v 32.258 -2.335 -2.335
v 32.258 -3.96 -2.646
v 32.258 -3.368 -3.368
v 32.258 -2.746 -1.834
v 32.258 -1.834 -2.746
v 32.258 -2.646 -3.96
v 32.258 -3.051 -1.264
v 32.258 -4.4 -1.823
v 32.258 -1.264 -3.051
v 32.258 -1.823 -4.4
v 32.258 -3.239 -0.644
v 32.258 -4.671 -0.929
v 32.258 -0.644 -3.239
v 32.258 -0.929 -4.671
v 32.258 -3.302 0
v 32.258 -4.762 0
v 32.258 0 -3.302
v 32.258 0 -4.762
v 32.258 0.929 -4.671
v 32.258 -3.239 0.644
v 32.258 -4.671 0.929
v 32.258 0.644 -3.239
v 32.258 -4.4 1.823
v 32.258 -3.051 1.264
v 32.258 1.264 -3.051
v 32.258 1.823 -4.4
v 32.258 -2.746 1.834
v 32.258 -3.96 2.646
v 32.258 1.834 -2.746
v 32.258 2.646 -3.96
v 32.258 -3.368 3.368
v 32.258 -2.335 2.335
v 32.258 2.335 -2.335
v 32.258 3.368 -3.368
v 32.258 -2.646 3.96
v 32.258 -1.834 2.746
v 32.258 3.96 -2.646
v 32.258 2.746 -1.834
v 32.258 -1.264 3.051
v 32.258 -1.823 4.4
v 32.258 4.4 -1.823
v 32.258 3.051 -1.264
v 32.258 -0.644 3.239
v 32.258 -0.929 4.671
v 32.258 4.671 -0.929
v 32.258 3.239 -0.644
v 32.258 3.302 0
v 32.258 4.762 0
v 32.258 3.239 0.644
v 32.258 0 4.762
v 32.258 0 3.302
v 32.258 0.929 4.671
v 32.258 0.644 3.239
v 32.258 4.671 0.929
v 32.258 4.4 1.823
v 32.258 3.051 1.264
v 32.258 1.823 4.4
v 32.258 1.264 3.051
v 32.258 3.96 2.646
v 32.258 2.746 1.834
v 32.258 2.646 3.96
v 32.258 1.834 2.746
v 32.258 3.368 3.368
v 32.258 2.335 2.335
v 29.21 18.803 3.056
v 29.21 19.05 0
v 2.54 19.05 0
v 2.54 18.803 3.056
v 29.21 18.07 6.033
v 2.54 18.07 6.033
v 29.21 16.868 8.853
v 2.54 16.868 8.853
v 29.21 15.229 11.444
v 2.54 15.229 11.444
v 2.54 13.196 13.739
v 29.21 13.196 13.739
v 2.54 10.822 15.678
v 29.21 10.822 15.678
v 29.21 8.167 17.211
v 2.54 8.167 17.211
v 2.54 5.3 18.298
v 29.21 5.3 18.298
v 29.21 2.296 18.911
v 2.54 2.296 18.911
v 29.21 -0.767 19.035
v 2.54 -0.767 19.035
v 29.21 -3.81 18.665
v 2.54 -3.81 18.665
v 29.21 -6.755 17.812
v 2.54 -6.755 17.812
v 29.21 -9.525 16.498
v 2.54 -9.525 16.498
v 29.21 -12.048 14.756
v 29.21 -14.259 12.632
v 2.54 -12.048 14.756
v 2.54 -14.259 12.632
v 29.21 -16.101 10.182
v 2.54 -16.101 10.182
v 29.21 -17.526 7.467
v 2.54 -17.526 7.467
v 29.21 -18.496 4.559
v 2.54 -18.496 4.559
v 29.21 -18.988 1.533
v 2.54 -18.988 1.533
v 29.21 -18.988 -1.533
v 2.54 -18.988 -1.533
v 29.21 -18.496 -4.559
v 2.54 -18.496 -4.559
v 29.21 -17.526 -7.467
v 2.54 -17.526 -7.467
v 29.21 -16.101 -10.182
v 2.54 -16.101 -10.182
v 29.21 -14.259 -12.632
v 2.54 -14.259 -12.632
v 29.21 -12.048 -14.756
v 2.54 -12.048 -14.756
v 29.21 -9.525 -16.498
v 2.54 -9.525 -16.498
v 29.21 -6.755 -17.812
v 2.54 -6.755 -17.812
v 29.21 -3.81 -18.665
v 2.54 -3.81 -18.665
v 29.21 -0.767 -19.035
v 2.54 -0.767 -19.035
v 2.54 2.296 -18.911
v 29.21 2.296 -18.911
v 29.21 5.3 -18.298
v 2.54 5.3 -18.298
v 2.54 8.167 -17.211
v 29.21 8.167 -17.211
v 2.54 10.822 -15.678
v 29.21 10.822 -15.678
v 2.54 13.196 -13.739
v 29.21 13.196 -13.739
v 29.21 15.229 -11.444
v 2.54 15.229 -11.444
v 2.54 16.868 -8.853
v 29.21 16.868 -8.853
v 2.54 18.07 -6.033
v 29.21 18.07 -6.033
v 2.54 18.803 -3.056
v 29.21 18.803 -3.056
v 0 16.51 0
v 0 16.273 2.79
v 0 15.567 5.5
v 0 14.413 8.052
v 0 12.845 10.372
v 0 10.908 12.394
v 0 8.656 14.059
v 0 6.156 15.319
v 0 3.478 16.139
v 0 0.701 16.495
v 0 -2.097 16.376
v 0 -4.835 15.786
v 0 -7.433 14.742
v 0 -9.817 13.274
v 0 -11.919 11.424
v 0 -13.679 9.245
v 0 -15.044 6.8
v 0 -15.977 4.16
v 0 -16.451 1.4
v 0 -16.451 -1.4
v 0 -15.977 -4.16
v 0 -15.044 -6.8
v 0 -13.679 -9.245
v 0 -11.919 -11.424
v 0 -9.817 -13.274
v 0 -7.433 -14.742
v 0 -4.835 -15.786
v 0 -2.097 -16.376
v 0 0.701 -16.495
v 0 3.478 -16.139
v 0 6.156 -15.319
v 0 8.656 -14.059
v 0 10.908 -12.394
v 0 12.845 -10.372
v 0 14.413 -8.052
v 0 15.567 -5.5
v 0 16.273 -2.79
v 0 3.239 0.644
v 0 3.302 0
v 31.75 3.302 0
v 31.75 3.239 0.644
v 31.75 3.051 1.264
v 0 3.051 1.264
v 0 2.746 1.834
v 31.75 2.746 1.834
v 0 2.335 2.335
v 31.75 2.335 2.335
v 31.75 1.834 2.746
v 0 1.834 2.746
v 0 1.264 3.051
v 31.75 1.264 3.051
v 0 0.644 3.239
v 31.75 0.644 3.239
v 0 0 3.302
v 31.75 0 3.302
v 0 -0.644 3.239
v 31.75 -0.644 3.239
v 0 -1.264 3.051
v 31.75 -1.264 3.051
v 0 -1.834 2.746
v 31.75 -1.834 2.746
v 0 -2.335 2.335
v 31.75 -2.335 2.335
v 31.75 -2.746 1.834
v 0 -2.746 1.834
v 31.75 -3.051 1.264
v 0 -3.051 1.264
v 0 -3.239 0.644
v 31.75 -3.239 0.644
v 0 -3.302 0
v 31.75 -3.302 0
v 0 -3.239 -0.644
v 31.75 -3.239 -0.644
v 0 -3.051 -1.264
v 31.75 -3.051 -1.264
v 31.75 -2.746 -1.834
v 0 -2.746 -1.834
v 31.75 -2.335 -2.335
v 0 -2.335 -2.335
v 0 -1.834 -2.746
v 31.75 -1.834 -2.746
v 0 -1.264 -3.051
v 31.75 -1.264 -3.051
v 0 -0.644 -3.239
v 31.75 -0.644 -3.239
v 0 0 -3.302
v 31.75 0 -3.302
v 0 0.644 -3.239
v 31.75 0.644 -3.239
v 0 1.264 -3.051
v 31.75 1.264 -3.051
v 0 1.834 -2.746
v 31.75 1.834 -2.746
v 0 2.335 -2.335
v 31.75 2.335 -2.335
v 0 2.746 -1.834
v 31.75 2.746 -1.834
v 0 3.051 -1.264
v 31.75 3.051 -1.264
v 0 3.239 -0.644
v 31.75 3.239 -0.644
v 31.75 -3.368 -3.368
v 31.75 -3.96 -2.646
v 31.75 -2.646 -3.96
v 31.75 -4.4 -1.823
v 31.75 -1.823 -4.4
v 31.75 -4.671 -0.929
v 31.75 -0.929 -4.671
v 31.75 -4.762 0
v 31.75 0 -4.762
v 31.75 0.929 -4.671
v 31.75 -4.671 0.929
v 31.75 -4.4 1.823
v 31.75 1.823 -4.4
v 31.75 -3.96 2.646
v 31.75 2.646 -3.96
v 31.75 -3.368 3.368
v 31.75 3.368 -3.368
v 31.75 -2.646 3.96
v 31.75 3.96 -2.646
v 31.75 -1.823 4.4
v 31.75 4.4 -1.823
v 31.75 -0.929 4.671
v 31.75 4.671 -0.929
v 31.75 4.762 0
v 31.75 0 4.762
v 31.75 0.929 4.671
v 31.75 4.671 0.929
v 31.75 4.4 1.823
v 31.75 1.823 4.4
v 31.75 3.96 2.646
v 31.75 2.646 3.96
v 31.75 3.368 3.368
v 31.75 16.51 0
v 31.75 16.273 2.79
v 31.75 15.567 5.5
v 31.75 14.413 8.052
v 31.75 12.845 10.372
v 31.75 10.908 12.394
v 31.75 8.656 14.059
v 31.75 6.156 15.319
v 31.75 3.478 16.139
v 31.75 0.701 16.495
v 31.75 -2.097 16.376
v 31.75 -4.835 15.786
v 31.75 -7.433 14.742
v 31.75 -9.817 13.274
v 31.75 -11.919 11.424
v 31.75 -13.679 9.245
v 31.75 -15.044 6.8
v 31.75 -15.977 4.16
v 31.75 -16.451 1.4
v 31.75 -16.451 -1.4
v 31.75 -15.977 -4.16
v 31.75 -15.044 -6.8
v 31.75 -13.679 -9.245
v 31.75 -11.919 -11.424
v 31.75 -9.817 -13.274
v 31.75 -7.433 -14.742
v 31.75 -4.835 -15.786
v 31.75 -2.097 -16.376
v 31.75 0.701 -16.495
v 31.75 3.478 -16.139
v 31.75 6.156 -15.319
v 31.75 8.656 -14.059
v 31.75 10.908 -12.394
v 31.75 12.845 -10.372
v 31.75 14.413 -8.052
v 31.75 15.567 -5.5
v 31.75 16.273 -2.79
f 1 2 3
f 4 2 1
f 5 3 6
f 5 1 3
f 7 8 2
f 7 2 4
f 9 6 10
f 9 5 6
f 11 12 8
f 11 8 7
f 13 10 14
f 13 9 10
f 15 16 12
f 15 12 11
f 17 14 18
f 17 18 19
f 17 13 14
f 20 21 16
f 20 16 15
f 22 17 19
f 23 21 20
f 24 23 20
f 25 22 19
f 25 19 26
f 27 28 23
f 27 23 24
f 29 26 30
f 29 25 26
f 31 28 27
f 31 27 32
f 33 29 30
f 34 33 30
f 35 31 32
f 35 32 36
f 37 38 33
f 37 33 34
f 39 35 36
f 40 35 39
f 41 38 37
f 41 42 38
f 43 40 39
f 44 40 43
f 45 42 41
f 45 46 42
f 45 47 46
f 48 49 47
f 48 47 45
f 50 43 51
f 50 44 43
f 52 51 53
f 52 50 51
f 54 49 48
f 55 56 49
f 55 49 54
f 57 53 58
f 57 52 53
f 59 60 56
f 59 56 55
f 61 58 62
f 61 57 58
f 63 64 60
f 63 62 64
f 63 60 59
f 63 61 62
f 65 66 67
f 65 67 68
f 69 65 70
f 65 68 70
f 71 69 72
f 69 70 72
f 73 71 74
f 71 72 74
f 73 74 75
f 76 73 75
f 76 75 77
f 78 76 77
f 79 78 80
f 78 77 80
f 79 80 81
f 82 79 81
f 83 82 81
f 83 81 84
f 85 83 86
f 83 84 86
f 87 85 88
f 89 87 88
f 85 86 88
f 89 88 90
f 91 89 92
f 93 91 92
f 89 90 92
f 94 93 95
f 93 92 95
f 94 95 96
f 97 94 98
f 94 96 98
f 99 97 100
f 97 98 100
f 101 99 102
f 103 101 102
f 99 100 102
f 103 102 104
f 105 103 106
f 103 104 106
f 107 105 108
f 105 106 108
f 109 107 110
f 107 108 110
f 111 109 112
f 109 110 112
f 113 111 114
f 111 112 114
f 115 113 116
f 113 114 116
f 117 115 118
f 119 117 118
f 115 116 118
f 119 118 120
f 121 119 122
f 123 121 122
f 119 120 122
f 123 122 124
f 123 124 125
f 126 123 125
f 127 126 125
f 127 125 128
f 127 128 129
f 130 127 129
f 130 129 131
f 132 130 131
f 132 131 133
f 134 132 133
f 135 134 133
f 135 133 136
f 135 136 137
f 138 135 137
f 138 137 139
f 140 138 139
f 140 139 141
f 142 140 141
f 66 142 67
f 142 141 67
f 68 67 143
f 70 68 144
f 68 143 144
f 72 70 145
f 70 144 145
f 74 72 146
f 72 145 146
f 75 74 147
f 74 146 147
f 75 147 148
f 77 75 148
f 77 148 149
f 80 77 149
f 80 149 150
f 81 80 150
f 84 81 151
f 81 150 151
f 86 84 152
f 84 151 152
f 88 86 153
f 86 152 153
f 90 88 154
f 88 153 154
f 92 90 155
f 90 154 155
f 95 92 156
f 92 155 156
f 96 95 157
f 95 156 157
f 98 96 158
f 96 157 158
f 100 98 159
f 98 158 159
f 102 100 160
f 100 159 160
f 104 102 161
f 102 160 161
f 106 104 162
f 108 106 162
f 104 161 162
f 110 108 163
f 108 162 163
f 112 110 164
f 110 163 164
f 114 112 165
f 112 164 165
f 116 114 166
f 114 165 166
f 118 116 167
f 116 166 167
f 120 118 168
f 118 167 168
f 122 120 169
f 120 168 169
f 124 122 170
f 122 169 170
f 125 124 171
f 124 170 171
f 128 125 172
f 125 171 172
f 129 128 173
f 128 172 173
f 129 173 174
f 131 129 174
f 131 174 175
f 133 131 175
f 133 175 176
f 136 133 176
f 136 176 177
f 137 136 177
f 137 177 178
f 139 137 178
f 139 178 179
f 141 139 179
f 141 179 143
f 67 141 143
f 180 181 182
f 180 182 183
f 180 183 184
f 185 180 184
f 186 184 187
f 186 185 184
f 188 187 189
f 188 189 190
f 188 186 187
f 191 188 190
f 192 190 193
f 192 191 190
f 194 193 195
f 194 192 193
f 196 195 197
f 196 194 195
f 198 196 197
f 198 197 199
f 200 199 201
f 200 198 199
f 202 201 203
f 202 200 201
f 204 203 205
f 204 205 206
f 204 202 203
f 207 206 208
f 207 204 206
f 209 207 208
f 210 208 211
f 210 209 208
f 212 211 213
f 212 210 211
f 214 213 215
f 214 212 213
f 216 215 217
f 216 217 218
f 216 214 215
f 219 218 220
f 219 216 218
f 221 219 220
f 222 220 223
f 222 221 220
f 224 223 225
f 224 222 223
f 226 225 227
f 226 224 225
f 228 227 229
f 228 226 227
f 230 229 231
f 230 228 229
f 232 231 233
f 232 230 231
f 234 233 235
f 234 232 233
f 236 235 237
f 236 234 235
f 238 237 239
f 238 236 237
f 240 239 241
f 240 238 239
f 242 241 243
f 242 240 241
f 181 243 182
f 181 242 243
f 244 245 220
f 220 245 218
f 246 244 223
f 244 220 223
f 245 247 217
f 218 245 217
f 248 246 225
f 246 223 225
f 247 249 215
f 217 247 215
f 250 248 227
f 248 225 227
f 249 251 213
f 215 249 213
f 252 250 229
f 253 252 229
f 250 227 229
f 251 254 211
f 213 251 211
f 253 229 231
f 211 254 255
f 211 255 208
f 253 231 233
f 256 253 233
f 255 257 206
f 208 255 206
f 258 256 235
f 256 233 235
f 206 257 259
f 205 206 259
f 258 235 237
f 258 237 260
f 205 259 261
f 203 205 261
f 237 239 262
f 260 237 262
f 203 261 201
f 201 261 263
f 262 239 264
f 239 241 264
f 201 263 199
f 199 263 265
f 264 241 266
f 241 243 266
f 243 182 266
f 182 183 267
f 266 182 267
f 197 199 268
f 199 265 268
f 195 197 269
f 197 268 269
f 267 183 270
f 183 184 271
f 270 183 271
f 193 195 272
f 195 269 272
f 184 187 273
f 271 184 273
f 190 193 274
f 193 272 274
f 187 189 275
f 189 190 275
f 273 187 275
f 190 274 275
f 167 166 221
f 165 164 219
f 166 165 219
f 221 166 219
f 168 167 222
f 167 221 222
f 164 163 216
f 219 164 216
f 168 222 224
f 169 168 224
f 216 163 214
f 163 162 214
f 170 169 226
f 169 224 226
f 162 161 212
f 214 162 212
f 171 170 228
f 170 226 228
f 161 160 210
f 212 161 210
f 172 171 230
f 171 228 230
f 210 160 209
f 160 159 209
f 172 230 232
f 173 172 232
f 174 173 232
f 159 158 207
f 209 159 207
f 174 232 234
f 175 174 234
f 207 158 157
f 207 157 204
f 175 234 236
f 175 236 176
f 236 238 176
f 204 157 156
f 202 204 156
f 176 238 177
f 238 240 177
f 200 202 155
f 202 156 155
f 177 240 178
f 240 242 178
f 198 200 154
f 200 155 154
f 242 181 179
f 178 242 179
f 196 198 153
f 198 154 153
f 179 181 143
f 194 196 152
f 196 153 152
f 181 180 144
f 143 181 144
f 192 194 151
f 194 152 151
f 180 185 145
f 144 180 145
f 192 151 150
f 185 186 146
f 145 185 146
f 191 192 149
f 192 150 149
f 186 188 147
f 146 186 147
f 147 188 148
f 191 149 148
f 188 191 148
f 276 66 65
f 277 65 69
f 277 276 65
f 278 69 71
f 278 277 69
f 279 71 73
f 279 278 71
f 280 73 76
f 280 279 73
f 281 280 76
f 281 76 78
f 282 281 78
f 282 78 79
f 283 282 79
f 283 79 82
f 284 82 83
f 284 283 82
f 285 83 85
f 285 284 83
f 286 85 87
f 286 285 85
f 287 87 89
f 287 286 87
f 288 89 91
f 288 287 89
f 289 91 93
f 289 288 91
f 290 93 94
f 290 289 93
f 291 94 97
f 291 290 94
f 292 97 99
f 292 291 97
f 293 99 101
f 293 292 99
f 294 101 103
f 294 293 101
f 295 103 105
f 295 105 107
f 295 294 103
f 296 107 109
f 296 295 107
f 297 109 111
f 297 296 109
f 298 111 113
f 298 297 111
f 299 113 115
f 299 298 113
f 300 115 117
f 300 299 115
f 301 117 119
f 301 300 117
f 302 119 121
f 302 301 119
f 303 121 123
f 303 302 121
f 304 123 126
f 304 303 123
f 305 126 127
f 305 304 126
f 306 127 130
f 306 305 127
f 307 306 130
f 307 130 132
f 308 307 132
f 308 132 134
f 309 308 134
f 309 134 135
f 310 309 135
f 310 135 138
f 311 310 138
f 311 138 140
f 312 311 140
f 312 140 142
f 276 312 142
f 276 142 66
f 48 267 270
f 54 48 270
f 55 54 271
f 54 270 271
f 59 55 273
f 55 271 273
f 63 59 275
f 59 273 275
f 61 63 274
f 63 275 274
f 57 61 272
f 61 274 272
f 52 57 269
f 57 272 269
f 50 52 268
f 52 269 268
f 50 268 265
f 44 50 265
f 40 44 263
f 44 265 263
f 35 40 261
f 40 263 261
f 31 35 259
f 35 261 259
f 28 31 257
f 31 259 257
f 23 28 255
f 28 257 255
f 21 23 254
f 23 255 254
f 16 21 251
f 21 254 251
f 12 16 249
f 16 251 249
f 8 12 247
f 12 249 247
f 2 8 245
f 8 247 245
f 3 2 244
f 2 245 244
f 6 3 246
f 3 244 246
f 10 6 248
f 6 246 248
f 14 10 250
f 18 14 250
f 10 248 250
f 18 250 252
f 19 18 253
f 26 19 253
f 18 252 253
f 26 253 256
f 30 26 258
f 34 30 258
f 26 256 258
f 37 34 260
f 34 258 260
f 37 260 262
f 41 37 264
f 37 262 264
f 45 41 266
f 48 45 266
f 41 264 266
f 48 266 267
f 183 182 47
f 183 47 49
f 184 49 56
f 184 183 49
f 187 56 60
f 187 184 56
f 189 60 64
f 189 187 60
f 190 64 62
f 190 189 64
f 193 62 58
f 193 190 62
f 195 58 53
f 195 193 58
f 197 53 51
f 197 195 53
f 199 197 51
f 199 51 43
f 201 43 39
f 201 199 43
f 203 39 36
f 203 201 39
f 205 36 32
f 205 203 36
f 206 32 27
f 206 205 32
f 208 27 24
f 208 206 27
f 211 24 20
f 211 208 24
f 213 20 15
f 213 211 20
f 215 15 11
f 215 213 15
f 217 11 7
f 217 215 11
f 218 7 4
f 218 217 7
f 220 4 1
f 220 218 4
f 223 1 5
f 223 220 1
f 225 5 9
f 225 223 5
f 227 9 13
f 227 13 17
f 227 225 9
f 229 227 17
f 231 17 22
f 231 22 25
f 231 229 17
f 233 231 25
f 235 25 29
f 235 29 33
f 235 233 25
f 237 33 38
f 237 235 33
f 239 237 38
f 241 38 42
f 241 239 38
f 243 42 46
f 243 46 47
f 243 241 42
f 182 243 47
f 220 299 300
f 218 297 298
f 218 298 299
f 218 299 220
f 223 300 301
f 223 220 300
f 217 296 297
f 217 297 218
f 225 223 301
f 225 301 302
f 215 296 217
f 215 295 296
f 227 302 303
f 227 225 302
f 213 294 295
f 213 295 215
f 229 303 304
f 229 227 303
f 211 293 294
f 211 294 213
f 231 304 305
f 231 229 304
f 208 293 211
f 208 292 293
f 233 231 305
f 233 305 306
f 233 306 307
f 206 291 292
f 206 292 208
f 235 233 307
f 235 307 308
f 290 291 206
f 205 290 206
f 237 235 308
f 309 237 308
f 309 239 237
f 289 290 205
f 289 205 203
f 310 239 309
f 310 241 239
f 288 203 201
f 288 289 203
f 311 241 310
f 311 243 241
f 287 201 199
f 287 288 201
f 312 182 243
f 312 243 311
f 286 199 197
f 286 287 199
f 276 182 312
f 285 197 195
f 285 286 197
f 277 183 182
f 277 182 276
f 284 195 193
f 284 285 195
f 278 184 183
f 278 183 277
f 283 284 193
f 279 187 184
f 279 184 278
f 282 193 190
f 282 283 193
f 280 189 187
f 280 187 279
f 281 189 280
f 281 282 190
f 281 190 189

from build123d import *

# Parameters (mm, degrees)
F0_R     = 19.05
F1_DEPTH = 31.75
F2_R     = 3.302
F3_DEPTH = 31.75
F4_SIZE  = 2.54
F5_R     = 4.7625
F5_R_2   = 3.302
F6_DEPTH = 0.508


with BuildPart() as f1:
    # F0 (on Right) → F1 (new body)
    with BuildSketch(Plane.YZ):
        Circle(F0_R)
    extrude(amount=F1_DEPTH)

    # F2 (on Right) → F3 (cut)
    with BuildSketch(Plane.YZ):
        Circle(F2_R)
    extrude(amount=F3_DEPTH, mode=Mode.SUBTRACT)

    # F4
    f4_edges = [f1.edges().sort_by_distance(p)[0] for p in [
        (31.75, -19.05, 0),
        (0, -19.05, 0),
    ]]
    chamfer(f4_edges, length=F4_SIZE)


with BuildPart() as f6:
    # F5 (on face) → F6 (new body)
    with BuildSketch(Plane.YZ.offset(31.75)):
        Circle(F5_R)
        Circle(F5_R_2, mode=Mode.SUBTRACT)
    extrude(amount=F6_DEPTH)


solid = Compound([f1.part, f6.part])
